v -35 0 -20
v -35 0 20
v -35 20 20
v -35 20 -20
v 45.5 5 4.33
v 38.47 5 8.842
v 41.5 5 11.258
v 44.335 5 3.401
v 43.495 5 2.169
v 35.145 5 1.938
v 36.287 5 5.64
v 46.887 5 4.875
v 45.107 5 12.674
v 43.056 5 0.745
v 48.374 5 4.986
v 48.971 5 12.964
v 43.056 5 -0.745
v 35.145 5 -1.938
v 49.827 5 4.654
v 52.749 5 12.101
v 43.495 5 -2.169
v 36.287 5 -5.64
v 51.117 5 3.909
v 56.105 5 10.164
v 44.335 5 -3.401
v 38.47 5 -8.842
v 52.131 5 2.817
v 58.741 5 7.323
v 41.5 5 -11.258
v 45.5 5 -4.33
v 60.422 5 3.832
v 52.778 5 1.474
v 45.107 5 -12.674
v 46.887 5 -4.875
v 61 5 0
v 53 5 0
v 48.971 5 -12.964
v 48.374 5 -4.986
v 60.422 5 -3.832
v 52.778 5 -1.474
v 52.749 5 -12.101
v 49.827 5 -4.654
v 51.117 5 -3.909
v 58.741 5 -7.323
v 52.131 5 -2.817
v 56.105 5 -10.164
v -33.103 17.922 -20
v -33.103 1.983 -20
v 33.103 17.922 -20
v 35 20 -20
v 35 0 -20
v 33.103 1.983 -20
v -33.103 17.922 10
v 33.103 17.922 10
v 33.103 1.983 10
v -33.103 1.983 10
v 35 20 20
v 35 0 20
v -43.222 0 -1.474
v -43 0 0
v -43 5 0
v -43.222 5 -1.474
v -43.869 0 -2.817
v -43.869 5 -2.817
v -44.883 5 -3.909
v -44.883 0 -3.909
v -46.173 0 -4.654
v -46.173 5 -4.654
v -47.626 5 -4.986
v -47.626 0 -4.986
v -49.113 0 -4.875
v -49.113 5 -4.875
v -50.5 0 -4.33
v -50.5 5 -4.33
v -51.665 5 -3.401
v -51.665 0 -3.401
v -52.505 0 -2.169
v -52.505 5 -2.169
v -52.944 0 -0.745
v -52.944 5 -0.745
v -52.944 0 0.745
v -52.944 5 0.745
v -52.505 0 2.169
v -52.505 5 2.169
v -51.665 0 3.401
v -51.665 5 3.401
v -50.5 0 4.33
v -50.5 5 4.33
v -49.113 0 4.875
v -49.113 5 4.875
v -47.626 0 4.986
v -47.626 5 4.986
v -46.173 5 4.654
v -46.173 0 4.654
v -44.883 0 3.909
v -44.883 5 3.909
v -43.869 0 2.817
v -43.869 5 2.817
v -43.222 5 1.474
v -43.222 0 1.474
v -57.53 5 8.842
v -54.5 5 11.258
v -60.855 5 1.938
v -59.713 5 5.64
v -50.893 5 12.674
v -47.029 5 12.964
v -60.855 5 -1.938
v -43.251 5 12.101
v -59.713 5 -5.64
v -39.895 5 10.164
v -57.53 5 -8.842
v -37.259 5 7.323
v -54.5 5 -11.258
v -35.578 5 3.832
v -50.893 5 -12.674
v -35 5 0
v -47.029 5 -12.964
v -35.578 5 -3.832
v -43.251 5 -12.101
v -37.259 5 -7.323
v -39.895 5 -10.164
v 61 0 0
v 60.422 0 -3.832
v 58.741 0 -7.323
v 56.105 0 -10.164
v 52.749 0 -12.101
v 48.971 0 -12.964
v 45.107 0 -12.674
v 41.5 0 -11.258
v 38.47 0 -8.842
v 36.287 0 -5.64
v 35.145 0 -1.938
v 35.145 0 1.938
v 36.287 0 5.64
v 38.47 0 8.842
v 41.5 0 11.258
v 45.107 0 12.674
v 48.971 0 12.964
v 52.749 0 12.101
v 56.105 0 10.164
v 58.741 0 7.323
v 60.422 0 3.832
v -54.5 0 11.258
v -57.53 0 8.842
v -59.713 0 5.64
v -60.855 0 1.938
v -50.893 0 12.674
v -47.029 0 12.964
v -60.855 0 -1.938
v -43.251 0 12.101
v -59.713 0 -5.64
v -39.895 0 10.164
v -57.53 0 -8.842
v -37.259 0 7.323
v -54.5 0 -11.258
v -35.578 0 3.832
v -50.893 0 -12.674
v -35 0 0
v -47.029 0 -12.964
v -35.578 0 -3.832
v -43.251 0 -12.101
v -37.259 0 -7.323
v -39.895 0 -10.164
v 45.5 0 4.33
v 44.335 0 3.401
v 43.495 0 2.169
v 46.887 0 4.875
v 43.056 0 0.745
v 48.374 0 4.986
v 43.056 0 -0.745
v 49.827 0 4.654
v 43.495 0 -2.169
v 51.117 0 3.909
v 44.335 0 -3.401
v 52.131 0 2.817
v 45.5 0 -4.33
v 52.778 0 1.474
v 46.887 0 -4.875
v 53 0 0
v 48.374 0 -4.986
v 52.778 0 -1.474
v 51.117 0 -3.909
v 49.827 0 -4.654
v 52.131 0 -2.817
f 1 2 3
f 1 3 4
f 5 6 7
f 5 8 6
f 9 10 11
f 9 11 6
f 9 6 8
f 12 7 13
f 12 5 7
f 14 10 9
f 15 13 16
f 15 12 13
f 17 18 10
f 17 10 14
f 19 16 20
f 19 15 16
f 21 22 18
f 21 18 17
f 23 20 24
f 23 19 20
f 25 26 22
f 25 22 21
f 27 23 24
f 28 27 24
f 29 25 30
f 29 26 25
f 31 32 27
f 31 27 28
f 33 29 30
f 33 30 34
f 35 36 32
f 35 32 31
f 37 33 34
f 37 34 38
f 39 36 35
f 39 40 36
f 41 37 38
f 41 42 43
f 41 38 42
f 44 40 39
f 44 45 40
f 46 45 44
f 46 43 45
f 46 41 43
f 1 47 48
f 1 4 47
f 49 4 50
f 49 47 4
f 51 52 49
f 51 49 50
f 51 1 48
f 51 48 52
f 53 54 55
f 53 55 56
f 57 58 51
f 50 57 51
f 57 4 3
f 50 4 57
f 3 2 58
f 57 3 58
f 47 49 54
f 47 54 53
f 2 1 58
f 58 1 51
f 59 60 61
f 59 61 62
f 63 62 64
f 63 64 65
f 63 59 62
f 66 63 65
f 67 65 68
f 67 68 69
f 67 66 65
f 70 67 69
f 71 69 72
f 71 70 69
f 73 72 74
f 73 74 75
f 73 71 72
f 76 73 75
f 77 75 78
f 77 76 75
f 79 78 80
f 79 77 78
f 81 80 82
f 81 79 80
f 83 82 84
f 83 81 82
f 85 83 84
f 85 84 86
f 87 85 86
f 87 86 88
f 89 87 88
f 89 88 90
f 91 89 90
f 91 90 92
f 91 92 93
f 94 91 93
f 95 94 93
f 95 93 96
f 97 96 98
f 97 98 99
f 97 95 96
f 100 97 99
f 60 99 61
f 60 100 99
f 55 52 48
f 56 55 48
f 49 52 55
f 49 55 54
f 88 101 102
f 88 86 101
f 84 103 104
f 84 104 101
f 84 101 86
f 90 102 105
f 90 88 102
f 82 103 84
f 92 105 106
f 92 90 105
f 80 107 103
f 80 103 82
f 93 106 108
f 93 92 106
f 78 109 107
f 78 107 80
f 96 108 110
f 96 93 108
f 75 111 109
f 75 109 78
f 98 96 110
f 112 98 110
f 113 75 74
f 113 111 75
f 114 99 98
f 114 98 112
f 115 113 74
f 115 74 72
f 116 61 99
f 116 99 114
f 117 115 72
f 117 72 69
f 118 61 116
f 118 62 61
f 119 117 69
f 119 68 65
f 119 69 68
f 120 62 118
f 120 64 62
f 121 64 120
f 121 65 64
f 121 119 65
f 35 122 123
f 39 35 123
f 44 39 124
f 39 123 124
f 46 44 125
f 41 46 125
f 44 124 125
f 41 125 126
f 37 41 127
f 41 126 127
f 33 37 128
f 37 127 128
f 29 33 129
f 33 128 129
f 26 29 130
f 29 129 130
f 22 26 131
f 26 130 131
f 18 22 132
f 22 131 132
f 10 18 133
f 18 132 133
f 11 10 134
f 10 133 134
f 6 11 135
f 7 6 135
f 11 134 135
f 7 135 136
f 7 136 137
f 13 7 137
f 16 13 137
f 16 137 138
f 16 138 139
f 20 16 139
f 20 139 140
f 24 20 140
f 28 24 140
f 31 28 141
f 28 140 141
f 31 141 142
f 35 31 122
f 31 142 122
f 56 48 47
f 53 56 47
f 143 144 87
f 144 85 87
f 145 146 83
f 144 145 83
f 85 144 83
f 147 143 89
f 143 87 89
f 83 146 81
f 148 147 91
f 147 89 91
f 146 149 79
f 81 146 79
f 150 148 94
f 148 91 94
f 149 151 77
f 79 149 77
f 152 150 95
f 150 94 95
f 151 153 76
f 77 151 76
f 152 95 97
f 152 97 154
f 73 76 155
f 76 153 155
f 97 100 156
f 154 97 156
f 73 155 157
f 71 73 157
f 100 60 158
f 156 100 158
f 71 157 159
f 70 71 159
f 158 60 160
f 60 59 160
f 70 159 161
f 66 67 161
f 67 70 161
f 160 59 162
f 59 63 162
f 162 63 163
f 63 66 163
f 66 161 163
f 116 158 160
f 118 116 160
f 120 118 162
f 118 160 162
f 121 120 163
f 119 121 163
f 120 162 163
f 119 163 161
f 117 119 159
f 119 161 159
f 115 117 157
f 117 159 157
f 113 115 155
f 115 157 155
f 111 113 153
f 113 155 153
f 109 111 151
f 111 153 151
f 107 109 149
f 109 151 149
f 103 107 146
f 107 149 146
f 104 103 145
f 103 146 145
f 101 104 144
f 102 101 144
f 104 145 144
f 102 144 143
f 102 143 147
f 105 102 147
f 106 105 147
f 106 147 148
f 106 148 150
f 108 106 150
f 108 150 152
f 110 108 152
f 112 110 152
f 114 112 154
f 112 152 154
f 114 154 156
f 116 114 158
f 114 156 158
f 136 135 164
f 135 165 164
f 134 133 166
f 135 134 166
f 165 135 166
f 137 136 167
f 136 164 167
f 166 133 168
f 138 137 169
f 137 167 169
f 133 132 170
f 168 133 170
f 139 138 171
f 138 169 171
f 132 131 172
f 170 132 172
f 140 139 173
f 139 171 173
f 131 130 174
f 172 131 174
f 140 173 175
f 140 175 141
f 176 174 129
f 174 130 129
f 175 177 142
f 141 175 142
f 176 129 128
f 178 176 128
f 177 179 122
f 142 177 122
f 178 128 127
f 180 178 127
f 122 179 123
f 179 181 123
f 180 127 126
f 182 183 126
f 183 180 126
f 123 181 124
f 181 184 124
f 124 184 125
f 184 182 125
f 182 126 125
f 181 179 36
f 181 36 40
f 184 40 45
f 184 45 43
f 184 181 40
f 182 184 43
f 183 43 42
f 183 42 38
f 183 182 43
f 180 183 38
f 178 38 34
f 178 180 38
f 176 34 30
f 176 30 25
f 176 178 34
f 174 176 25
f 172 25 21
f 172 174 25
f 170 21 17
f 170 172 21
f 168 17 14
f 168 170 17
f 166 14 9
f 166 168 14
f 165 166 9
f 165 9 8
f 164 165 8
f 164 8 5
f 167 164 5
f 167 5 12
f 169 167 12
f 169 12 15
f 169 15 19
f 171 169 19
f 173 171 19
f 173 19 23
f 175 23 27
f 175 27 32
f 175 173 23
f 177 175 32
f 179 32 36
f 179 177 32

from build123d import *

# Parameters (mm, degrees)
EXTRUDE_1_DEPTH     = 20
SKETCH_3_W          = 66.20559445
SKETCH_3_H          = 15.93838385
CUT_EXTRUDE_2_DEPTH = 30
SKETCH_1_8_R        = 13
SKETCH_1_8_R_2      = 5
EXTRUDE_5_DEPTH     = 5
SKETCH_1_9_R        = 13
SKETCH_1_9_R_2      = 5
EXTRUDE_6_DEPTH     = 5


with BuildPart() as part:
    # 草图1 → 凸台-拉伸1 (new body)
    with BuildSketch(Plane(origin=(0, 0, 0), x_dir=(1, 0, 0), z_dir=(0, 1, 0))):
        Polygon((-35, -20), (35, -20), (35, -1.9e-08), (35, 20), (-35, 20), (-35, 0), align=None)
    extrude(amount=EXTRUDE_1_DEPTH)

    # 草图3 → 切除-拉伸2 (cut)
    with BuildSketch(Plane(origin=(0, 0, -20), x_dir=(-1, 0, 0), z_dir=(0, 0, -1))):
        with Locations((0, 9.952430017)):
            Rectangle(SKETCH_3_W, SKETCH_3_H)
    extrude(amount=-CUT_EXTRUDE_2_DEPTH, mode=Mode.SUBTRACT)


with BuildPart() as body_2:
    # 草图1<8> → 凸台-拉伸5 (new body)
    with BuildSketch(Plane(origin=(0, 0, 0), x_dir=(1, 0, 0), z_dir=(0, 1, 0))):
        with Locations((48, 0)):
            Circle(SKETCH_1_8_R)
        with Locations((48, 0)):
            Circle(SKETCH_1_8_R_2, mode=Mode.SUBTRACT)
    extrude(amount=EXTRUDE_5_DEPTH)


with BuildPart() as body_3:
    # 草图1<9> → 凸台-拉伸6 (new body)
    with BuildSketch(Plane(origin=(0, 0, 0), x_dir=(1, 0, 0), z_dir=(0, 1, 0))):
        with Locations((-48, 0)):
            Circle(SKETCH_1_9_R)
        with Locations((-48, 0)):
            Circle(SKETCH_1_9_R_2, mode=Mode.SUBTRACT)
    extrude(amount=EXTRUDE_6_DEPTH)


solid = Compound([part.part, body_2.part, body_3.part])
